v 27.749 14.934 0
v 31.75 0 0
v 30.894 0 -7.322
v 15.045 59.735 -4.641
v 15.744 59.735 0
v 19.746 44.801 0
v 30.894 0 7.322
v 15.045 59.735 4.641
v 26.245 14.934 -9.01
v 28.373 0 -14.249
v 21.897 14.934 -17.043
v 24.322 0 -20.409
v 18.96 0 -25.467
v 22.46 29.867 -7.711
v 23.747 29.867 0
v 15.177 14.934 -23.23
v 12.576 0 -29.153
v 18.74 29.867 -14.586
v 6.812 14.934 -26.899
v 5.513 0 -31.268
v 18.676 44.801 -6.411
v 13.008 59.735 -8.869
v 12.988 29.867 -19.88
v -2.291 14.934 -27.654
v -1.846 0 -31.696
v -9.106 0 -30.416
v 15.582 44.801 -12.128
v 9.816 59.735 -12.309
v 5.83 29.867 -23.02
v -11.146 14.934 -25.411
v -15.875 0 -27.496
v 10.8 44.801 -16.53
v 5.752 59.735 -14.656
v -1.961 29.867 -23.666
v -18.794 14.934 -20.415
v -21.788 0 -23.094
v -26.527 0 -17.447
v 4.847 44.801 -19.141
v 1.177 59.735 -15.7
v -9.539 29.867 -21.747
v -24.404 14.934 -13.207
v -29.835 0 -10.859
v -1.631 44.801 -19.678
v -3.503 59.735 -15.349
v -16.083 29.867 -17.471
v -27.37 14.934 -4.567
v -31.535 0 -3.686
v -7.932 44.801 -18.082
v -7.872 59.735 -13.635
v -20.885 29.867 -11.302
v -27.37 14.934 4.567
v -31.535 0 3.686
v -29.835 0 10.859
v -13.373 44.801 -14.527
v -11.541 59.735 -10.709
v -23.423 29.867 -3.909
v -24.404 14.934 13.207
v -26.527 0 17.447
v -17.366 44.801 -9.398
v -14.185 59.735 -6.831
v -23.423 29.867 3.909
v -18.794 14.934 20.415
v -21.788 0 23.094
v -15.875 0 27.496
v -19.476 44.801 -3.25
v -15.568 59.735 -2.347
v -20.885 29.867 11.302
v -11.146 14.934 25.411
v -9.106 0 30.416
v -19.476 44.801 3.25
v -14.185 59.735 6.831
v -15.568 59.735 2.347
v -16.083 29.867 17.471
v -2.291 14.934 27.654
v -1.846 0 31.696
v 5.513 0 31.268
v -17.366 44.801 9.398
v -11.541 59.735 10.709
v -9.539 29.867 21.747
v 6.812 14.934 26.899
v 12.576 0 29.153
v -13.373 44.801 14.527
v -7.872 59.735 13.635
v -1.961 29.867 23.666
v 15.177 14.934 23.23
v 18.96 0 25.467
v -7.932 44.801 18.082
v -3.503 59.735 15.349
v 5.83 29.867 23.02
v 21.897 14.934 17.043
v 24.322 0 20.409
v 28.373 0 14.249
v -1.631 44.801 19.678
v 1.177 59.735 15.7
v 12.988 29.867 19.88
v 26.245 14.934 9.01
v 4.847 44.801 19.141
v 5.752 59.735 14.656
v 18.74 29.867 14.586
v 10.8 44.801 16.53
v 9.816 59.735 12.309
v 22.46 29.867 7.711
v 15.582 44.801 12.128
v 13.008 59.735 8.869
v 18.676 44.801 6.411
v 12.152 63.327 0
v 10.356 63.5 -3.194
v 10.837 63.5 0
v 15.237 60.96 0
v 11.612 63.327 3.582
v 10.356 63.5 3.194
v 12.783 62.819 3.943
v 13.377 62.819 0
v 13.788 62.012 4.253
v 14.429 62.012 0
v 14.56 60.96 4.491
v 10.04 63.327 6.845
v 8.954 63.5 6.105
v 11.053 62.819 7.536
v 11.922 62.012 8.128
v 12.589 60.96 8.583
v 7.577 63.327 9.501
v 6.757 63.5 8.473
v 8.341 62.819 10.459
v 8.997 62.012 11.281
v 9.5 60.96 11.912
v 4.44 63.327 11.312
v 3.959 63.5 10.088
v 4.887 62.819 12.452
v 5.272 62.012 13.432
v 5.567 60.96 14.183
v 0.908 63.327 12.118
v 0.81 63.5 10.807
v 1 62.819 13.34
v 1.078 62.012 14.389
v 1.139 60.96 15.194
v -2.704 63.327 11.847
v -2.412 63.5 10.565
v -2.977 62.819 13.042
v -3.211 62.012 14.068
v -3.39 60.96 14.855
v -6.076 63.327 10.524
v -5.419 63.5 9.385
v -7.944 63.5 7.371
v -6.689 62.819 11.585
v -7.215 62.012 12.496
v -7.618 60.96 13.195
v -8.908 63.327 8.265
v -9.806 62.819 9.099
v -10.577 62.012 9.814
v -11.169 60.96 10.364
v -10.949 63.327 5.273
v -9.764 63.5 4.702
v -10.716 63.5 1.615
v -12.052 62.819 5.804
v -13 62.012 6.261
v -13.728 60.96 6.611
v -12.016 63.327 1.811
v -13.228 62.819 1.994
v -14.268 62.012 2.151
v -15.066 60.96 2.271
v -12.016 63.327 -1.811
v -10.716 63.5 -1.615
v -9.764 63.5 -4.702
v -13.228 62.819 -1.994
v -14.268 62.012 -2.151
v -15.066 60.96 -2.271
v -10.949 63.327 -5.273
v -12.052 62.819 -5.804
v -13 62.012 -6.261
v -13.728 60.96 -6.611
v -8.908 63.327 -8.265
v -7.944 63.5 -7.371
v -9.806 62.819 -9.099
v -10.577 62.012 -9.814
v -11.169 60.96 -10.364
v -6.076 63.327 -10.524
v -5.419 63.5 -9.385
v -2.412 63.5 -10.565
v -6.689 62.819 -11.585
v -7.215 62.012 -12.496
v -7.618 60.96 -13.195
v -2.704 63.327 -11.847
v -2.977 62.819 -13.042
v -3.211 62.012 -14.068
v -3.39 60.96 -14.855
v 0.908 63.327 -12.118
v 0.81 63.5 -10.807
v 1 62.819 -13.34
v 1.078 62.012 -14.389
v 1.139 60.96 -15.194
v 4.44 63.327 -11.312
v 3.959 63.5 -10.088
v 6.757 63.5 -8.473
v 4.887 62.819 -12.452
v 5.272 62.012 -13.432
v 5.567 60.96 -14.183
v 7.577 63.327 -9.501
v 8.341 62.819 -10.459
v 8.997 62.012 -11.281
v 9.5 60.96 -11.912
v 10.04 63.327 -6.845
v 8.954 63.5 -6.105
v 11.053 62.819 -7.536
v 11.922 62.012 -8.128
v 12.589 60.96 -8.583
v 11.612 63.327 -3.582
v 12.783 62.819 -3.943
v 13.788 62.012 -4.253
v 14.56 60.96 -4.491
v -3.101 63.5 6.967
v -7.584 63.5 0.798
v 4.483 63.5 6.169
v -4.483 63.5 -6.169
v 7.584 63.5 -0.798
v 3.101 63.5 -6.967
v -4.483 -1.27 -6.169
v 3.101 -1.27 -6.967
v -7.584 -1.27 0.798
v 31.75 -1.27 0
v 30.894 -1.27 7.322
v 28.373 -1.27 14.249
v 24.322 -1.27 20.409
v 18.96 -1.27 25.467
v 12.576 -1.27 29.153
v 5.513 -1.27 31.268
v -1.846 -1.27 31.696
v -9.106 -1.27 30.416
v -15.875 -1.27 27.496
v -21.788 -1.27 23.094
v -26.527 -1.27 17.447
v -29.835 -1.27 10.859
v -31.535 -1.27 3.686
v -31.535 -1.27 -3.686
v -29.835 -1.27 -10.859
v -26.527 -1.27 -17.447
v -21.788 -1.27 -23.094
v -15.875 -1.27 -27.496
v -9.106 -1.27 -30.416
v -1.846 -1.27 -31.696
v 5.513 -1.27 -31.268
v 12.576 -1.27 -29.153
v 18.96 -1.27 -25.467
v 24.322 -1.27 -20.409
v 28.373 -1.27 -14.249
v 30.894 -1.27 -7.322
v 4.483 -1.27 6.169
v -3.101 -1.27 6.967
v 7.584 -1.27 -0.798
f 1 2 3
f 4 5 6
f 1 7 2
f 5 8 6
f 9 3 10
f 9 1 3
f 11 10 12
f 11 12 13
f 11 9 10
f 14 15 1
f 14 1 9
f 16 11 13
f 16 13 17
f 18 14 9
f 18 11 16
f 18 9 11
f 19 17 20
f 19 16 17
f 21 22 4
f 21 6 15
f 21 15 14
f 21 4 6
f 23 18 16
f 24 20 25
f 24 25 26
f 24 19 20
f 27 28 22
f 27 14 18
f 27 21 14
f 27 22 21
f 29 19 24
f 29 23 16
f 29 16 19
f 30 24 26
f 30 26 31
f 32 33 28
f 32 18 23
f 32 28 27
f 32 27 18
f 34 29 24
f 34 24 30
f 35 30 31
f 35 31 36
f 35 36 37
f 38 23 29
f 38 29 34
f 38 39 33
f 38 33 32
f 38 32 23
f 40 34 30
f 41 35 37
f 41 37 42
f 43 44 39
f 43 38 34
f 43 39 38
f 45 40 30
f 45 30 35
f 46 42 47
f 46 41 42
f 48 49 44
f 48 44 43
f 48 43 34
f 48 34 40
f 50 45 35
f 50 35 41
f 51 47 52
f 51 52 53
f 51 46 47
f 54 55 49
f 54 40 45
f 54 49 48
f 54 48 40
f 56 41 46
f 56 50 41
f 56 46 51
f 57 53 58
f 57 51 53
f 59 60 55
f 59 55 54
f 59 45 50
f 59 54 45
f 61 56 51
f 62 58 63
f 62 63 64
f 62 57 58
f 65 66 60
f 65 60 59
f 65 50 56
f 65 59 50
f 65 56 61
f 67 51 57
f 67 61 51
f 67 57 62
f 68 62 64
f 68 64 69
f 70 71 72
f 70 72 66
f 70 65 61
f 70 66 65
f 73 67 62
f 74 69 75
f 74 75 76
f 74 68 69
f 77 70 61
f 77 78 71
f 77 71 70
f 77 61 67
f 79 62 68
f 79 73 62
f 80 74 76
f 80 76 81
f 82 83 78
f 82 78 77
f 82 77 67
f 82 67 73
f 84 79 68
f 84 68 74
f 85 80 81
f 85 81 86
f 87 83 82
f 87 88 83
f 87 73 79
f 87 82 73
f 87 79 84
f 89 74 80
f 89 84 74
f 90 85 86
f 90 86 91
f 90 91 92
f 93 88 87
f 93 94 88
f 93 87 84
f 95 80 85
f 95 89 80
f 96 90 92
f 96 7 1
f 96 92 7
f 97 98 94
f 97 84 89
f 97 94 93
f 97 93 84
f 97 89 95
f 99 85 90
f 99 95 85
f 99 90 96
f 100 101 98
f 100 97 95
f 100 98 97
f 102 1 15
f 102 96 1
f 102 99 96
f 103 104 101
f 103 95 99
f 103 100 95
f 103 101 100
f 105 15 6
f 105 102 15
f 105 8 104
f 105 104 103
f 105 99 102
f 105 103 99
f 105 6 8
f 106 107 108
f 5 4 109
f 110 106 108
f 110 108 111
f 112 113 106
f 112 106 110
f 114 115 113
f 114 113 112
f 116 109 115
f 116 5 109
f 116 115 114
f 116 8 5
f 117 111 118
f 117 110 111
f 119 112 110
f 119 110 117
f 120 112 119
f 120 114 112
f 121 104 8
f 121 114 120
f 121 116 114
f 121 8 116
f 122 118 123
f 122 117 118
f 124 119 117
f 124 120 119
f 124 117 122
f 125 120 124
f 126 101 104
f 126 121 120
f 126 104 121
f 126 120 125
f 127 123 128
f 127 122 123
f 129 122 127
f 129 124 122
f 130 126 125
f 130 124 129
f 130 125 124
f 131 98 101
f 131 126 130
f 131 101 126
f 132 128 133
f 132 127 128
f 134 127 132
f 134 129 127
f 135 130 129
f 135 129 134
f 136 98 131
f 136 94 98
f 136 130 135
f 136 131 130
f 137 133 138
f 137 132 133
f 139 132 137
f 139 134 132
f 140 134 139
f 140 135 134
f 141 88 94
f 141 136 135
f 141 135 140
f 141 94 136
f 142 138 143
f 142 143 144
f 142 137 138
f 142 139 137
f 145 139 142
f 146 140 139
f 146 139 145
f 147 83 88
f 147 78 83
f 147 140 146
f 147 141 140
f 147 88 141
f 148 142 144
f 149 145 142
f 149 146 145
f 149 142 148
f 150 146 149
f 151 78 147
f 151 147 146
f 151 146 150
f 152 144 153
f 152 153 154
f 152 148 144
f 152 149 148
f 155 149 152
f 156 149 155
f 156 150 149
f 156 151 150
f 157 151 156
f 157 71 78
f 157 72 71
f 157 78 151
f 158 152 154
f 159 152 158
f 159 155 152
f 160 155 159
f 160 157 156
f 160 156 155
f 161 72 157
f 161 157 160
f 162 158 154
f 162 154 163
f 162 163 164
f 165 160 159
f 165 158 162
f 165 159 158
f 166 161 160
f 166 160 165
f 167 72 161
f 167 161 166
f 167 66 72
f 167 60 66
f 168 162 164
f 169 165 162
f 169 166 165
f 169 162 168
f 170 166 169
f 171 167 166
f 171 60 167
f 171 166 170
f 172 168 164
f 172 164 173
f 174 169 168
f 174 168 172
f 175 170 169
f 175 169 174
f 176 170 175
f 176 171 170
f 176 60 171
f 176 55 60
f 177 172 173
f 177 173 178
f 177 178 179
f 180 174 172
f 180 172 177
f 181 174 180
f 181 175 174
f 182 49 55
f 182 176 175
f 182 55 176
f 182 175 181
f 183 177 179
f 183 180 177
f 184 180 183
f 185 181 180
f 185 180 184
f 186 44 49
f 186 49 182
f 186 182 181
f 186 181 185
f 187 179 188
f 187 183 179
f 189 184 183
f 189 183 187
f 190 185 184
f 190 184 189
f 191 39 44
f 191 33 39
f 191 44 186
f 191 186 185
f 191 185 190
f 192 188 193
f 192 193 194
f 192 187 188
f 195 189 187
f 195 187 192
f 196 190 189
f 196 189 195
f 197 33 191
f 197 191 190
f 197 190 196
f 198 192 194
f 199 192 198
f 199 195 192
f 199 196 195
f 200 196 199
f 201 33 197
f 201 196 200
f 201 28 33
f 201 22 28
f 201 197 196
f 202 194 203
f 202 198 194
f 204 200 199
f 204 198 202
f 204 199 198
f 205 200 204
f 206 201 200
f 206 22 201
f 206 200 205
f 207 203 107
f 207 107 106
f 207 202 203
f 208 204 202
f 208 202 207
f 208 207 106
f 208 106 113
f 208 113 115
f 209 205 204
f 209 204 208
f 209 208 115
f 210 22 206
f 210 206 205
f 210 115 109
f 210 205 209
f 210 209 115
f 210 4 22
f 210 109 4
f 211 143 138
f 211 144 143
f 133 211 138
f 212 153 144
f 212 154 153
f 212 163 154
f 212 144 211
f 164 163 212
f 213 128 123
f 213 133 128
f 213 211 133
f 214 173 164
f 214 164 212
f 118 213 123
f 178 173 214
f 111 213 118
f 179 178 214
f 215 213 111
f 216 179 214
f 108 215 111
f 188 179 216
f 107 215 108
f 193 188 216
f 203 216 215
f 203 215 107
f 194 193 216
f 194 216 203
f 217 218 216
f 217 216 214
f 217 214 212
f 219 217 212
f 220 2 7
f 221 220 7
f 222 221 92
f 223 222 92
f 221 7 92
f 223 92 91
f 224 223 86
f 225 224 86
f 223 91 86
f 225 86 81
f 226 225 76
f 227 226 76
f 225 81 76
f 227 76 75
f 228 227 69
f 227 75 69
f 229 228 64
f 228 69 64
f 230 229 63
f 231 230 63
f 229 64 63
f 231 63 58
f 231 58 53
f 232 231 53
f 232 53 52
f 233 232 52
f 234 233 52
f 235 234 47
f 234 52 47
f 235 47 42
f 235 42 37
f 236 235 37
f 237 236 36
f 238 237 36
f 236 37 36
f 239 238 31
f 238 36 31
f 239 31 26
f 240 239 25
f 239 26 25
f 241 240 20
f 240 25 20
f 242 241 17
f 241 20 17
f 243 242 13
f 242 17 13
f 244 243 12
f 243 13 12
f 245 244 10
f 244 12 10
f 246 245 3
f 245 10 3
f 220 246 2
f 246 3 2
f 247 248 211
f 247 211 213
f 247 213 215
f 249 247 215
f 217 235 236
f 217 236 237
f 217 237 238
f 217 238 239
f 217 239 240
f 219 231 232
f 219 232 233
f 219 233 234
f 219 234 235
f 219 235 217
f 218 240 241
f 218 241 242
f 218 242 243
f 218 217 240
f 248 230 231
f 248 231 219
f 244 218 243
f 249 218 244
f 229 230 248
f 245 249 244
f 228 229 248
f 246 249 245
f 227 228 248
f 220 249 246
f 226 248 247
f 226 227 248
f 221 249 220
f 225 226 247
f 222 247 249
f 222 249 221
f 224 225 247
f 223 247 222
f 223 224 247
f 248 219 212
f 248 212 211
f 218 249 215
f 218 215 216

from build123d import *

# Parameters (mm, degrees)
SKETCH2_R               = 31.75
BOSS_EXTRUDE1_DEPTH     = 63.5
BOSS_EXTRUDE1_TAPER     = 15
SKETCH3_R               = 31.75
BOSS_EXTRUDE2_DEPTH     = 1.27
CUT_EXTRUDE2_DEPTH      = 64.5000001
CUT_EXTRUDE2_DEPTH_BACK = 2.27
FILLET1_R               = 5.08


with BuildPart() as part:
    # Sketch2 → Boss-Extrude1 (new body)
    with BuildSketch(Plane(origin=(0, 0, 0), x_dir=(1, 0, 0), z_dir=(0, 1, 0))):
        Circle(SKETCH2_R)
    extrude(amount=BOSS_EXTRUDE1_DEPTH, taper=BOSS_EXTRUDE1_TAPER)

    # Sketch3 → Boss-Extrude2 (add)
    with BuildSketch(Plane.XZ):
        Circle(SKETCH3_R)
    extrude(amount=BOSS_EXTRUDE2_DEPTH)

    # Sketch7 → Cut-Extrude2 (cut, two sides)
    with BuildSketch(Plane(origin=(0, 0, 0), x_dir=(1, 0, 0), z_dir=(0, 1, 0))) as cut_extrude2_sk:
        Polygon((4.482800658, -6.168866962), (7.583795831, 0.79778577), (3.100995172, 6.966652731), (-4.482800658, 6.168866962), (-7.583795831, -0.79778577), (-3.100995172, -6.966652731), align=None)
    extrude(amount=CUT_EXTRUDE2_DEPTH, mode=Mode.SUBTRACT)
    extrude(cut_extrude2_sk.sketch, amount=-CUT_EXTRUDE2_DEPTH_BACK, mode=Mode.SUBTRACT)

    # Fillet1
    fillet1_edges = [part.edges().sort_by_distance(p)[0] for p in [
        (-14.735226281, 63.5, 0),
    ]]
    fillet(fillet1_edges, radius=FILLET1_R)


solid = part.part
